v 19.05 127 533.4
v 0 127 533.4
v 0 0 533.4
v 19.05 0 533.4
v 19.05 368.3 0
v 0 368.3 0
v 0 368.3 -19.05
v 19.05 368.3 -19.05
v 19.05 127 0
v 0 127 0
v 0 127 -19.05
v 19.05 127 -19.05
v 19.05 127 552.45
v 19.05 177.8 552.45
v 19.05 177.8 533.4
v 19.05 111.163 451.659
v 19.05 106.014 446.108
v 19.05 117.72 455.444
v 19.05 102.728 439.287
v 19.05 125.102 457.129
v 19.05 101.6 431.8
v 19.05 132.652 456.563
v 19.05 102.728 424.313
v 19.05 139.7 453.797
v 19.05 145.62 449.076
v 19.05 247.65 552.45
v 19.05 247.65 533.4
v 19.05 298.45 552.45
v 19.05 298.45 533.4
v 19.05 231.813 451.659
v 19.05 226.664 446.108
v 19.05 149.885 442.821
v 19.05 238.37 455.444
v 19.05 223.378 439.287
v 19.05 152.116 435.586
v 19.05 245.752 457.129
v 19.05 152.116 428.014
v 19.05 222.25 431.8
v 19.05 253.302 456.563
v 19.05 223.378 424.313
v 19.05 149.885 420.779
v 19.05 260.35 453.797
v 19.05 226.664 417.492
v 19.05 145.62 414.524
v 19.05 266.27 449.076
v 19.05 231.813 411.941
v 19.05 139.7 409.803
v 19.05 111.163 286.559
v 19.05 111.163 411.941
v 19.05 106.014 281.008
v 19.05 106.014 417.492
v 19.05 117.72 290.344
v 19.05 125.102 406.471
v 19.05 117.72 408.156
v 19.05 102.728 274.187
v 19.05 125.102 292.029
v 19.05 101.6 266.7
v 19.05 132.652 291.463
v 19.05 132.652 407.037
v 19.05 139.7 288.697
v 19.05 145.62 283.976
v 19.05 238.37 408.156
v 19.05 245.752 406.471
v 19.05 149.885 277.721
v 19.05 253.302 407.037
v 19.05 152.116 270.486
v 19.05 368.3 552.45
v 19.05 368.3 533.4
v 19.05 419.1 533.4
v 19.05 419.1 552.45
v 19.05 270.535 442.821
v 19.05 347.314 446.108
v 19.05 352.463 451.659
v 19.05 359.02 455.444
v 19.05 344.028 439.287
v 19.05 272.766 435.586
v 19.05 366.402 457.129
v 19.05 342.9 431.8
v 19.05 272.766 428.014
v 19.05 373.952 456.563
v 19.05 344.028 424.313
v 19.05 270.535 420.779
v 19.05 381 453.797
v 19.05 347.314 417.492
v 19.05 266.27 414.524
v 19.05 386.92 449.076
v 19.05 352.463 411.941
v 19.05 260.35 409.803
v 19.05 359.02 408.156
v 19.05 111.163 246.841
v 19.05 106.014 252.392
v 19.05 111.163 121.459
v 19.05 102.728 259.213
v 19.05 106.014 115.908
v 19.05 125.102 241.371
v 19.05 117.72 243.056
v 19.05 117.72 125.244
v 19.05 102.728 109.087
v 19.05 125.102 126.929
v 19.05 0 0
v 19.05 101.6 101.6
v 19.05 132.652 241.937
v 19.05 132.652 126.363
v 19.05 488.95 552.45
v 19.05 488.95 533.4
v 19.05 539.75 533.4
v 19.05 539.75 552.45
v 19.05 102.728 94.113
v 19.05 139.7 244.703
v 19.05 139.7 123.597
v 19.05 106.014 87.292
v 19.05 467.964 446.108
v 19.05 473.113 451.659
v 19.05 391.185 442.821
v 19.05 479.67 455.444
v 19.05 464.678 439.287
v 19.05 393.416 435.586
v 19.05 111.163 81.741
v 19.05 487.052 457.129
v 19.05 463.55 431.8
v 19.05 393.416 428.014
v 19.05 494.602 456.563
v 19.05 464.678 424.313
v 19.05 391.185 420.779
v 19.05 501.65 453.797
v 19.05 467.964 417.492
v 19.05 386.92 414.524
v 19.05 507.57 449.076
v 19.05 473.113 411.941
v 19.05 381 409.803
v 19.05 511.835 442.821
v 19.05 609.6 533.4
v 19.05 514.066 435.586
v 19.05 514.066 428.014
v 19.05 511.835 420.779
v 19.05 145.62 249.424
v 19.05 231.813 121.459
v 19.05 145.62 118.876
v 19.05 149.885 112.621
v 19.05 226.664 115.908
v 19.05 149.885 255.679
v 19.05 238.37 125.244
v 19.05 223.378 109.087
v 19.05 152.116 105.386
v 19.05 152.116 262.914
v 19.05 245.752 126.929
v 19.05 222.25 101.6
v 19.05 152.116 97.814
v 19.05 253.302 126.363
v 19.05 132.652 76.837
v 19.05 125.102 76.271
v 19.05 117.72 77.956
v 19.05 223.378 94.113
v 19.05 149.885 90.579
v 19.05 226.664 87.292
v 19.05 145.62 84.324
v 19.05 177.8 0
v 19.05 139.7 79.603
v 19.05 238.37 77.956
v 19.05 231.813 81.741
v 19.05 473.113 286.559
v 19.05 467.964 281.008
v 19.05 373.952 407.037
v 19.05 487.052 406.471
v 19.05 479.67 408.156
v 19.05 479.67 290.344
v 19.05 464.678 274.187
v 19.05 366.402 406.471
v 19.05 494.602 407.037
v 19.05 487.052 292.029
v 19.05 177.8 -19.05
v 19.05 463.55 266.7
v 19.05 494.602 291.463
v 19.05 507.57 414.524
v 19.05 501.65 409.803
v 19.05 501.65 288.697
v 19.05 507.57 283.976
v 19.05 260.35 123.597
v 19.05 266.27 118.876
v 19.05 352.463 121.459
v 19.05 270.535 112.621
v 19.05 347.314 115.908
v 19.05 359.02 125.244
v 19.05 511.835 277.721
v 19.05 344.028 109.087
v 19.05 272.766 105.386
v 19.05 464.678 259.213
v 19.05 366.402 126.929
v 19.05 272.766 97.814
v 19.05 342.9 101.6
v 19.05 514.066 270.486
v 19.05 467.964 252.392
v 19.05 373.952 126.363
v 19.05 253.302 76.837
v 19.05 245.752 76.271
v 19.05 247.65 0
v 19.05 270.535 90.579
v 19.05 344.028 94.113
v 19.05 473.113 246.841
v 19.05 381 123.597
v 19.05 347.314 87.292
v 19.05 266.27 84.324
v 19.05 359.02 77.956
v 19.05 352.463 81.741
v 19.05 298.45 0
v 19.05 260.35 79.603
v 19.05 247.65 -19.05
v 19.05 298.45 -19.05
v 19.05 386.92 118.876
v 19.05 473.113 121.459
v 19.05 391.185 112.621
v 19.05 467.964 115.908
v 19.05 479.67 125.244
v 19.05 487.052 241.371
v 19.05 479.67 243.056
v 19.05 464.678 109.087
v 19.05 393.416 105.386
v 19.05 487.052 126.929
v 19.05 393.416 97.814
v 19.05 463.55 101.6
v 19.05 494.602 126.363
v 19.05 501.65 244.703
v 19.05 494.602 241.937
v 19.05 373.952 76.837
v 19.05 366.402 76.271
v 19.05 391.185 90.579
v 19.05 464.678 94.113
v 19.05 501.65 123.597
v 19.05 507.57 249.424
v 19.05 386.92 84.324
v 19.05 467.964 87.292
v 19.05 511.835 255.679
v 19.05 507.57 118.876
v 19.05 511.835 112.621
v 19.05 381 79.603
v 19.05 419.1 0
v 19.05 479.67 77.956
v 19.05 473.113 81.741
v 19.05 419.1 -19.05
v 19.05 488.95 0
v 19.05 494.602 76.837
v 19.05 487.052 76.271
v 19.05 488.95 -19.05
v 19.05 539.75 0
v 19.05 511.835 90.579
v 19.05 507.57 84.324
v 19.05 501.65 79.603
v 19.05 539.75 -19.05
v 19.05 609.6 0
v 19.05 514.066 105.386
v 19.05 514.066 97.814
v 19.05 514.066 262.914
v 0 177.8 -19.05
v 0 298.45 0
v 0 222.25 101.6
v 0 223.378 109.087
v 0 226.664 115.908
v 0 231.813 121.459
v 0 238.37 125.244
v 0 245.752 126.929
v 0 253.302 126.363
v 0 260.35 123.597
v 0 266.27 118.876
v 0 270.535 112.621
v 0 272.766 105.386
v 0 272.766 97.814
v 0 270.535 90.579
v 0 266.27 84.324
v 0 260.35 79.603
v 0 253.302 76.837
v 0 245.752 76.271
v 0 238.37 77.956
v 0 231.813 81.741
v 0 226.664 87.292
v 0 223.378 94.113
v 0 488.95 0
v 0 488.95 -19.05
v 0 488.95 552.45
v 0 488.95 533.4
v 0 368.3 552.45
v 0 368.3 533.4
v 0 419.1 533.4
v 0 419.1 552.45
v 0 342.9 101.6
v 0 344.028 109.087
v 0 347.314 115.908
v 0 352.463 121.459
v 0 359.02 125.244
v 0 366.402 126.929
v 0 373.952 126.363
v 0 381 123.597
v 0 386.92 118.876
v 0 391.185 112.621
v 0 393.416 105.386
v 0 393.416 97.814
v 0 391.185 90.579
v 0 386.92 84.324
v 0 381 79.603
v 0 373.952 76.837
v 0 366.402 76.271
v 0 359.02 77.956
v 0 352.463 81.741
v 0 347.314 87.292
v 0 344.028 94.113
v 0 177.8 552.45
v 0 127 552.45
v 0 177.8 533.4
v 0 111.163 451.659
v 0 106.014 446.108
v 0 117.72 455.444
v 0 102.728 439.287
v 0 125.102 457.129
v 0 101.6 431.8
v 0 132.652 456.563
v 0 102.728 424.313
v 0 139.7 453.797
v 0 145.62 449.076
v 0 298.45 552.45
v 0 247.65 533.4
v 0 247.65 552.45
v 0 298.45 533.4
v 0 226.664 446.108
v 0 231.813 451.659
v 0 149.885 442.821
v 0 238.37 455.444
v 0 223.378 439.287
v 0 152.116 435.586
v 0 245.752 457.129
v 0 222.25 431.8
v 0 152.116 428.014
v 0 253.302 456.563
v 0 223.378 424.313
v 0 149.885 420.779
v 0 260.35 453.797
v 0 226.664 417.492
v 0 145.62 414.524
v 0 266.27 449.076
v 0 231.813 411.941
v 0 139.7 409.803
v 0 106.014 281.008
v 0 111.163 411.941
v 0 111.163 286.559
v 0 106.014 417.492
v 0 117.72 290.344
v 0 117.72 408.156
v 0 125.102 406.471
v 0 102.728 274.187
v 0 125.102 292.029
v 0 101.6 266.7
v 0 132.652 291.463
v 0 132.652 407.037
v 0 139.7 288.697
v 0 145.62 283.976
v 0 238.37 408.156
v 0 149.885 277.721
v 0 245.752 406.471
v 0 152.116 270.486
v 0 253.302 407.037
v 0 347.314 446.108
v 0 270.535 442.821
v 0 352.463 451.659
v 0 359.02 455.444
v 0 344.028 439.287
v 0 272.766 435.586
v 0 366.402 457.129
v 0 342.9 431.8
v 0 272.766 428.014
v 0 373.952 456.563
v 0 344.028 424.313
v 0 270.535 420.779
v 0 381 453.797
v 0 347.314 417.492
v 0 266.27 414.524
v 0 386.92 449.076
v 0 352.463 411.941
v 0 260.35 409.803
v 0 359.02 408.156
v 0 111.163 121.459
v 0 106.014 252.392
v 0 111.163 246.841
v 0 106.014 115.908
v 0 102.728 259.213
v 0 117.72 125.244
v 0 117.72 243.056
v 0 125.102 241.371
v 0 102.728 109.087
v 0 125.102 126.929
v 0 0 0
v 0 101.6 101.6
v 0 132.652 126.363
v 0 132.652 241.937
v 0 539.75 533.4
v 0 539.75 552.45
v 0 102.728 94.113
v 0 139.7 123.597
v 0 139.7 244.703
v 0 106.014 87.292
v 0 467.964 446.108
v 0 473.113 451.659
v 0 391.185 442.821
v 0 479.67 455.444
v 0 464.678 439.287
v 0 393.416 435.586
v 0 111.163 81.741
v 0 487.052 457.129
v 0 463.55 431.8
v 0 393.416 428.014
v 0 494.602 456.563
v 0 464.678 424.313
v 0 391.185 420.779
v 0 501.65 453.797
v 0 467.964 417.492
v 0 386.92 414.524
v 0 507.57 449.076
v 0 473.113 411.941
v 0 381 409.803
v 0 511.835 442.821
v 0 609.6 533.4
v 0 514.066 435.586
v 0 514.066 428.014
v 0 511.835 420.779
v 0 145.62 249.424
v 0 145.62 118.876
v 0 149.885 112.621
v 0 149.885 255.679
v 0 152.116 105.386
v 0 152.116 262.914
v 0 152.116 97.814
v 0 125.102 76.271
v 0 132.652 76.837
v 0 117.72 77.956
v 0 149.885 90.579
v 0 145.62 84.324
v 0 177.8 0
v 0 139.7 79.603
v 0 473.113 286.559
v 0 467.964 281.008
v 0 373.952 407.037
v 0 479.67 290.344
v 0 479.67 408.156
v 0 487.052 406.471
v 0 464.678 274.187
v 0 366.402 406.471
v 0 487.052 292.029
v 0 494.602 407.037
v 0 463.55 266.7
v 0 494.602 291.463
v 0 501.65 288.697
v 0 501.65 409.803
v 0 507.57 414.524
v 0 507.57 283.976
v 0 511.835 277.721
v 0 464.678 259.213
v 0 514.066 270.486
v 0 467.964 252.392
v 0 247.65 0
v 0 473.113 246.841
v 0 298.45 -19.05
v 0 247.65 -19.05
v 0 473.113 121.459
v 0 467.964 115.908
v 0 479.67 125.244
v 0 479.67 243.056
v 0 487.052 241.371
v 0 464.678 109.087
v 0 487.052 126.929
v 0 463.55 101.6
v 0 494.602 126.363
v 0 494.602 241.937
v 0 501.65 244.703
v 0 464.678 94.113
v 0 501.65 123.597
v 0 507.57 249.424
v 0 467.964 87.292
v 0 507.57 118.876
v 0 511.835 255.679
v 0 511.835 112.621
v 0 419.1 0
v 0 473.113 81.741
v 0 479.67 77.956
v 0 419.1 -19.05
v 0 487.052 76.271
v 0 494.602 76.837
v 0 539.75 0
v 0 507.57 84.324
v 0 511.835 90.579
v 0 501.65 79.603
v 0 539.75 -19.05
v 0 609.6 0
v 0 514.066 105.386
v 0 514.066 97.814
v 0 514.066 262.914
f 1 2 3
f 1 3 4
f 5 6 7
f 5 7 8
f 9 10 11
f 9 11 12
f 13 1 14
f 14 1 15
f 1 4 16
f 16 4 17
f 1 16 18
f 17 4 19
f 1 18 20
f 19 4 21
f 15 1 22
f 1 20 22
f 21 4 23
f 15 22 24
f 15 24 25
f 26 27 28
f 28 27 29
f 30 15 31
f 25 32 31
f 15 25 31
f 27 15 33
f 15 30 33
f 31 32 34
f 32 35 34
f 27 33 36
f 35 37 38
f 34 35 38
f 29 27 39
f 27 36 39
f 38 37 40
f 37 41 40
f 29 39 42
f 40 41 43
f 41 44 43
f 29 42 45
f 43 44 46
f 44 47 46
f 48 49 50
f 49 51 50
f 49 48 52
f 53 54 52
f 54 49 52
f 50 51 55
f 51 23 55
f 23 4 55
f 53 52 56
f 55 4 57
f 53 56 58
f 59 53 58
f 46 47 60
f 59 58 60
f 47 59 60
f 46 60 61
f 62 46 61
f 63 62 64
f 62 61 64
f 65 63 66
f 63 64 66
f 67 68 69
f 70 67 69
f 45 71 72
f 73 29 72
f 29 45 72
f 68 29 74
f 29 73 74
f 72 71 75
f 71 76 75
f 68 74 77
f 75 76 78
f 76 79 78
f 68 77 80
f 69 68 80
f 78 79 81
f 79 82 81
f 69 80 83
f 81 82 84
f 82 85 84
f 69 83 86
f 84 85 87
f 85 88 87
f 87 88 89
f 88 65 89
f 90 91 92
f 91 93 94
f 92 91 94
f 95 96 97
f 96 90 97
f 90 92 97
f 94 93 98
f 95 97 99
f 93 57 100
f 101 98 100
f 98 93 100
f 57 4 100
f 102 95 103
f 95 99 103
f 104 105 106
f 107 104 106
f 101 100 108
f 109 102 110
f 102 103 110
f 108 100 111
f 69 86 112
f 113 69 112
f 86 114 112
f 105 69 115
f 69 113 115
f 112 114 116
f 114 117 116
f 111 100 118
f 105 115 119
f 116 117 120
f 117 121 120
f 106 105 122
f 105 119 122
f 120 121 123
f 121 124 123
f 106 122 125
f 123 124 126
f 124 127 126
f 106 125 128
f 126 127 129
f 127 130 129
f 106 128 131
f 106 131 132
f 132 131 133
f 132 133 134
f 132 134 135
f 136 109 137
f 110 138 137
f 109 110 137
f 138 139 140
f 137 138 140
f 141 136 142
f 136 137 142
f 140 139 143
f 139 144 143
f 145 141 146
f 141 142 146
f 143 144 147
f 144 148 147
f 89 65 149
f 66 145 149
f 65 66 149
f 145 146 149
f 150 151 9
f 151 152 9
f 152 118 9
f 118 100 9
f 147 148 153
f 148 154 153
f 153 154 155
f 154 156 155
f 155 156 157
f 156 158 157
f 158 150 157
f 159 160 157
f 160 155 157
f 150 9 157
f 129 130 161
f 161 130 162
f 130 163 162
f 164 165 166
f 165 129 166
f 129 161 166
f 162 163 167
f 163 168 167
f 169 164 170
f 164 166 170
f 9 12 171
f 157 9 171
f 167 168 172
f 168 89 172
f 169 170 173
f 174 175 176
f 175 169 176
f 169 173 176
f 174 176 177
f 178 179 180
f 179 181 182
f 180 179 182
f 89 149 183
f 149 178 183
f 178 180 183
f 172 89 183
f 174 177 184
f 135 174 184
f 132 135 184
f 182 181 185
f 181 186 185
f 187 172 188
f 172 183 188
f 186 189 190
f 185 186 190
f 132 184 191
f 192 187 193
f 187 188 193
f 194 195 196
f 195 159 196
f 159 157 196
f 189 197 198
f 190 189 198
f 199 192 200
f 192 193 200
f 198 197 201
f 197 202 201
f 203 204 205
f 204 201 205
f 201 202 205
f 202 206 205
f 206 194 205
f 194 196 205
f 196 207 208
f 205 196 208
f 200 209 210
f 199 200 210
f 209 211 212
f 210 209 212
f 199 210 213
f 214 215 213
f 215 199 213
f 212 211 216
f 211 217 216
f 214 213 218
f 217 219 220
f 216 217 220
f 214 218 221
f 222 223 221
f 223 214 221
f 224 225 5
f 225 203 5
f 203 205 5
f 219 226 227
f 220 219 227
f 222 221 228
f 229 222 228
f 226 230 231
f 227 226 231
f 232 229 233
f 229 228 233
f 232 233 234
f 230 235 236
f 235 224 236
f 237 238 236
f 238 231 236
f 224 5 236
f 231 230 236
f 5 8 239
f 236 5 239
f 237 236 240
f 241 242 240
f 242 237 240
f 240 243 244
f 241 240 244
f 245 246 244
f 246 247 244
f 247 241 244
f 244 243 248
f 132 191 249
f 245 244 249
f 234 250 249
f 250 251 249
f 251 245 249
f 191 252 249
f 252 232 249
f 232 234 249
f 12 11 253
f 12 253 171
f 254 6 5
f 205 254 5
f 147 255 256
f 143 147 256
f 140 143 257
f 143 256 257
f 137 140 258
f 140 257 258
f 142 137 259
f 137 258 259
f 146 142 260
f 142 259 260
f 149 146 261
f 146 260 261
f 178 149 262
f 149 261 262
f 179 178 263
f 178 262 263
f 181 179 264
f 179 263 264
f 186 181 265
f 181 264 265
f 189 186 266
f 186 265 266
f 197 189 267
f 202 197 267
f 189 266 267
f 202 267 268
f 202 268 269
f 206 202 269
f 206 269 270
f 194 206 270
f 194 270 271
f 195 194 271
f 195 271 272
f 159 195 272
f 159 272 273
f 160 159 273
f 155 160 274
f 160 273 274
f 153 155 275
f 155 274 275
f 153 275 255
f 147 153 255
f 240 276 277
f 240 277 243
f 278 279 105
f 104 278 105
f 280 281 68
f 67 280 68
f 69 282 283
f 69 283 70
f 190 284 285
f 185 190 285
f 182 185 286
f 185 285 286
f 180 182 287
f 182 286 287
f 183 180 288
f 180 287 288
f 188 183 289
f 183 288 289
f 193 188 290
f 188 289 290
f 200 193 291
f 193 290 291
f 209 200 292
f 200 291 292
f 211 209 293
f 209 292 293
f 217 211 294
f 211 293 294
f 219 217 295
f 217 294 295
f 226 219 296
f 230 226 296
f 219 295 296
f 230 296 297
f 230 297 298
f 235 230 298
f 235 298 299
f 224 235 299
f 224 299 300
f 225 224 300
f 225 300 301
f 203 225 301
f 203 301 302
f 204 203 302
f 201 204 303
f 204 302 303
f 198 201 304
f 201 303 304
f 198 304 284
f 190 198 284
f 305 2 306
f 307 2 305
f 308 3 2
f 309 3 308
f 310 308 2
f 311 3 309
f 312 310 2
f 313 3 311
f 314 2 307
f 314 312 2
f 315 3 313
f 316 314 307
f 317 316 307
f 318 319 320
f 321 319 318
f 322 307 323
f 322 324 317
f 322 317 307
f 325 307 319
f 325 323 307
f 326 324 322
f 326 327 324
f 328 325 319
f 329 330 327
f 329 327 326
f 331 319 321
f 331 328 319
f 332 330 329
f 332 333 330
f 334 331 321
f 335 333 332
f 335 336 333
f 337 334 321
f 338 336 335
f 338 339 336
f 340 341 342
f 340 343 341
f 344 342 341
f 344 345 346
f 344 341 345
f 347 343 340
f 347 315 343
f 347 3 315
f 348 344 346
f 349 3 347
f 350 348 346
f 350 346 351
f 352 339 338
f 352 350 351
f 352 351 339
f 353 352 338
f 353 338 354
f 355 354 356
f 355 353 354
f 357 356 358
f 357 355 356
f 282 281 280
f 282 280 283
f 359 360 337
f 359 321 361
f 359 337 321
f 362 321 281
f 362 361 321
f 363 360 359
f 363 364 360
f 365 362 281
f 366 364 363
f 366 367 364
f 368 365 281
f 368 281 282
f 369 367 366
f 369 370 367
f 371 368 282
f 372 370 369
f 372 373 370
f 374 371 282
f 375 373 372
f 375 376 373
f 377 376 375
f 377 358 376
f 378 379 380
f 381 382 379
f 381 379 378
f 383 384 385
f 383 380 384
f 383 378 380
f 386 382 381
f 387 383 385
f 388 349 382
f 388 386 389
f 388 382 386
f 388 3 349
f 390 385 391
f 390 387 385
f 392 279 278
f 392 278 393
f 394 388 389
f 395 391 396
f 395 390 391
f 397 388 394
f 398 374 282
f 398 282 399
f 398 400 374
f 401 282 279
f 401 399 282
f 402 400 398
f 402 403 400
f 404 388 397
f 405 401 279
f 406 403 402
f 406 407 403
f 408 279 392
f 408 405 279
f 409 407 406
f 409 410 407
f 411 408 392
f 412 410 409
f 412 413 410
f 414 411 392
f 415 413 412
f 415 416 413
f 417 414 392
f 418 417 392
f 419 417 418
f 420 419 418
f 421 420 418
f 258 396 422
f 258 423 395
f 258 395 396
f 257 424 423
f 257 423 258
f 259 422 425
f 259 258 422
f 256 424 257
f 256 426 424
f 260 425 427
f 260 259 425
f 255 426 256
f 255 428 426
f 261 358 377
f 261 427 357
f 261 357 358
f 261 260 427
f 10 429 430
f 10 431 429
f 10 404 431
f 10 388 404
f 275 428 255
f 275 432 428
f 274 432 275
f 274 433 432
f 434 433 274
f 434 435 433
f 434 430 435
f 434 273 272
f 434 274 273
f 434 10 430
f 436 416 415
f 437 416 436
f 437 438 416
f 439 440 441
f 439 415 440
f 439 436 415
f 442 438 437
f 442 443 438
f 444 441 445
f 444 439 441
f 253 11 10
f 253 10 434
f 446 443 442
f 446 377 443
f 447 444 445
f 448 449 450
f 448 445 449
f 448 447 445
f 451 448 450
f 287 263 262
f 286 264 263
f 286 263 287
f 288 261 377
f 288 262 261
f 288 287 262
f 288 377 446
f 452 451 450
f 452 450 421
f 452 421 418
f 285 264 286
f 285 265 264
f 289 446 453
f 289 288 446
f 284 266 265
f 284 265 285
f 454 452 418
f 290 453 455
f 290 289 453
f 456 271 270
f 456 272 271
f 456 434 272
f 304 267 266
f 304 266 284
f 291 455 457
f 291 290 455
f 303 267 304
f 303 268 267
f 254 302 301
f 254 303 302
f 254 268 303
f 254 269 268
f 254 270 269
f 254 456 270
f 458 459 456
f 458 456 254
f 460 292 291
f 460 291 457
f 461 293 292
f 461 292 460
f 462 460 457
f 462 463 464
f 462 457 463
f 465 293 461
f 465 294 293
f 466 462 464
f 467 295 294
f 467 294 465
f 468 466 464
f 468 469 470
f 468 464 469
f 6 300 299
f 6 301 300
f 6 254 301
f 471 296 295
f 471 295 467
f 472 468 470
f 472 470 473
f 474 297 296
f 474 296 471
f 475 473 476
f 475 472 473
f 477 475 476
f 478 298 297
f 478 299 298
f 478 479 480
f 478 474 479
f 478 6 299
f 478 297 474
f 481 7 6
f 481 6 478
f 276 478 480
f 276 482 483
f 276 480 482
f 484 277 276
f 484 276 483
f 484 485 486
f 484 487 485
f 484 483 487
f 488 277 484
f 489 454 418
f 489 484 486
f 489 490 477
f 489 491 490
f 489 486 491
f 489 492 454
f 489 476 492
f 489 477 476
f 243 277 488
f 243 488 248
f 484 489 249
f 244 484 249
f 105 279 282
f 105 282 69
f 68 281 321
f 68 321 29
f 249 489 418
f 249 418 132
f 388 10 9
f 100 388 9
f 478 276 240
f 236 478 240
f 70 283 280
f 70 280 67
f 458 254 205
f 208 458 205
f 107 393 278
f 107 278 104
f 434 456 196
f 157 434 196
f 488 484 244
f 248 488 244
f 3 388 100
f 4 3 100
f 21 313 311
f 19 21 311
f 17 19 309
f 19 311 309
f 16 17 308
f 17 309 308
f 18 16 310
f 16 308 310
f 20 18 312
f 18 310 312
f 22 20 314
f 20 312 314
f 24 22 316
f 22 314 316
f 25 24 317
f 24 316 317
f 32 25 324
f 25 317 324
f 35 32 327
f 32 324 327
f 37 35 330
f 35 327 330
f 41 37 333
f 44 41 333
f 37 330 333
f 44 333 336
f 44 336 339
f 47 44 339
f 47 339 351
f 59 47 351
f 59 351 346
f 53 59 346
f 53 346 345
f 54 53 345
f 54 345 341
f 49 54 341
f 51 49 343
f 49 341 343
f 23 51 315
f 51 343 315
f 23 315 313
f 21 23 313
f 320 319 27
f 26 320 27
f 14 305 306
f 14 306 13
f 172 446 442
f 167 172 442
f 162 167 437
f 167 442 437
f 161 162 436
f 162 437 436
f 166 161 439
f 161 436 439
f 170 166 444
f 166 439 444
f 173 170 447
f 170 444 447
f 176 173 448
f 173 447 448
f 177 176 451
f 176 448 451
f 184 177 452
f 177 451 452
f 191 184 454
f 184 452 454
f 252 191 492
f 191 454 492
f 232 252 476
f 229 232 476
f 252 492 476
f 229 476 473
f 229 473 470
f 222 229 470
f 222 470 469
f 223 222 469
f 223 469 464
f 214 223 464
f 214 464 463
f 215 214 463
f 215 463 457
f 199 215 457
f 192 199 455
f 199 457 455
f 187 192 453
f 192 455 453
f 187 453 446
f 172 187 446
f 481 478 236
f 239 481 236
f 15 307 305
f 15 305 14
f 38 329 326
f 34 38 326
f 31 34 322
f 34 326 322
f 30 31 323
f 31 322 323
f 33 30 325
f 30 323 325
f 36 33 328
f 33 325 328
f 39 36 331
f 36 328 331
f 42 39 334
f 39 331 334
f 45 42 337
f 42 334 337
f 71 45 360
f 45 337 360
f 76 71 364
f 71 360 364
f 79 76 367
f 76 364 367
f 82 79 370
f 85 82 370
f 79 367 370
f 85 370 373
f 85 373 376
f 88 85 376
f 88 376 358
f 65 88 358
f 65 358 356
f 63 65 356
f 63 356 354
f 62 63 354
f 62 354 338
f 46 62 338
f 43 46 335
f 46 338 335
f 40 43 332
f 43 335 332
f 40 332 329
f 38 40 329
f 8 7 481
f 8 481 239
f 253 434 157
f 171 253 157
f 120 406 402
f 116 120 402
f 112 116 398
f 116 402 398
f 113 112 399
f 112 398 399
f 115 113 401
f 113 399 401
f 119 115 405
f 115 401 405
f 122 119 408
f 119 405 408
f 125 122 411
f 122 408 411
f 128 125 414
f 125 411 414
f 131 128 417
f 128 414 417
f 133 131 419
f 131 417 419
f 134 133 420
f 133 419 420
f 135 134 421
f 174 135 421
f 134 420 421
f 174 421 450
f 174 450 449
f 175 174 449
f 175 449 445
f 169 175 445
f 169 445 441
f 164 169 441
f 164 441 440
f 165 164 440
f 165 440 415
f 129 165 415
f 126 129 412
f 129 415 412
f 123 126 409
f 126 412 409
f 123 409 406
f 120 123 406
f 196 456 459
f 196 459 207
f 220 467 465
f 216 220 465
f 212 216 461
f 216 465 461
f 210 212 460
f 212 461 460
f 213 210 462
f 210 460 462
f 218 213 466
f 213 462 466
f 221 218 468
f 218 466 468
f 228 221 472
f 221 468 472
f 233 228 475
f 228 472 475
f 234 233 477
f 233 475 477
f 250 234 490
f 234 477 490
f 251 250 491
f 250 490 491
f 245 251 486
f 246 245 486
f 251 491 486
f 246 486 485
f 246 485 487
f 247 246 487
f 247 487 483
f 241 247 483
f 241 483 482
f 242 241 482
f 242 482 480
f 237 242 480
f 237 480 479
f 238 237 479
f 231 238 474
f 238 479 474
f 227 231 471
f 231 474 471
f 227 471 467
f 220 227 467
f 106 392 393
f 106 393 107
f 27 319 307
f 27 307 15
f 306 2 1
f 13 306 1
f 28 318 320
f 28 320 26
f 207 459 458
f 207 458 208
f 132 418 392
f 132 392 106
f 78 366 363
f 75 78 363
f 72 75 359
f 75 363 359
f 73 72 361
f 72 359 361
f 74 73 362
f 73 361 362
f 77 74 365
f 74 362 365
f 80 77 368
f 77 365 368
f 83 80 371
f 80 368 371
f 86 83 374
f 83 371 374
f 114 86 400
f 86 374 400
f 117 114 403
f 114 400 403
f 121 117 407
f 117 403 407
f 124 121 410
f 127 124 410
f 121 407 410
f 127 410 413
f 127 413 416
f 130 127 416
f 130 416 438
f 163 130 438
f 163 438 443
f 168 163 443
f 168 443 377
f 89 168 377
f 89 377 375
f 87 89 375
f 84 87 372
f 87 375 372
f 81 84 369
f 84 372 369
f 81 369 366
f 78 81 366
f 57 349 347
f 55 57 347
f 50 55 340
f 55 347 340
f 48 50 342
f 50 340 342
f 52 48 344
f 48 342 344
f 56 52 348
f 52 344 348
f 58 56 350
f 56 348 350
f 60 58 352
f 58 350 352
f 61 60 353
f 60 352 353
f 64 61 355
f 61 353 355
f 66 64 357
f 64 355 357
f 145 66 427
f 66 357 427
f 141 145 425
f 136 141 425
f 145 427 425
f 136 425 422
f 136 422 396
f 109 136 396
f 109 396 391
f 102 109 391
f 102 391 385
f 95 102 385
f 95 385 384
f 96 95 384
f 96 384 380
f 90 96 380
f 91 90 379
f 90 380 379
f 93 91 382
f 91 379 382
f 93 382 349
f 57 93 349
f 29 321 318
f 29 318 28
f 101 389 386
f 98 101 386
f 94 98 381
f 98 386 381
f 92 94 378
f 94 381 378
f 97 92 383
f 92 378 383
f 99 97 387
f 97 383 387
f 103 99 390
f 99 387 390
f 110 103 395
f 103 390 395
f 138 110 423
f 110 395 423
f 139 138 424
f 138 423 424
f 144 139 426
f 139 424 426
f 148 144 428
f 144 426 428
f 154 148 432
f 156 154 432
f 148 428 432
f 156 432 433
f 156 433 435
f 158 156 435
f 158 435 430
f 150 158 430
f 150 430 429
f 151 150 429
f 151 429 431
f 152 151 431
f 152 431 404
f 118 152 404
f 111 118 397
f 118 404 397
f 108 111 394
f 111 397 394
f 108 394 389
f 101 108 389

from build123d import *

# Parameters (mm, degrees)
F0_W     = 19.05
F0_H     = 609.6
F1_DEPTH = 533.4
F2_W     = 19.05
F2_H     = 50.8
F3_DEPTH = 19.05
F4_W     = 19.05
F4_H     = 50.8
F5_DEPTH = 19.05
F6_R     = 25.4
F7_DEPTH = 19.05


with BuildPart() as f1:
    # F0 (on Top) → F1 (new body)
    with BuildSketch(Plane.XY):
        with Locations((9.525, 304.8)):
            Rectangle(F0_W, F0_H)
    extrude(amount=F1_DEPTH)

    # F2 (on face) → F3 (join)
    with BuildSketch(Plane(origin=(0, 0, 0), x_dir=(1, 0, 0), z_dir=(0, 0, -1))):
        with Locations((9.525, -152.4)):
            Rectangle(F2_W, F2_H)
        with Locations((9.525, -273.05)):
            Rectangle(F2_W, F2_H)
        with Locations((9.525, -393.7)):
            Rectangle(F2_W, F2_H)
        with Locations((9.525, -514.35)):
            Rectangle(F2_W, F2_H)
    extrude(amount=F3_DEPTH)

    # F4 (on face) → F5 (join)
    with BuildSketch(Plane.XY.offset(533.4)):
        with Locations((9.525, 514.35)):
            Rectangle(F4_W, F4_H)
        with Locations((9.525, 393.7)):
            Rectangle(F4_W, F4_H)
        with Locations((9.525, 273.05)):
            Rectangle(F4_W, F4_H)
        with Locations((9.525, 152.4)):
            Rectangle(F4_W, F4_H)
    extrude(amount=F5_DEPTH)

    # F6 (on face) → F7 (cut)
    with BuildSketch(Plane(origin=(0, 0, 0), x_dir=(0, -1, 0), z_dir=(-1, 0, 0))):
        with Locations((-488.95, 101.6)):
            Circle(F6_R)
        with Locations((-368.3, 101.6)):
            Circle(F6_R)
        with Locations((-247.65, 101.6)):
            Circle(F6_R)
        with Locations((-127, 101.6)):
            Circle(F6_R)
        with Locations((-488.95, 431.8)):
            Circle(F6_R)
        with Locations((-368.3, 431.8)):
            Circle(F6_R)
        with Locations((-247.65, 431.8)):
            Circle(F6_R)
        with Locations((-127, 431.8)):
            Circle(F6_R)
        with Locations((-127, 266.7)):
            Circle(F6_R)
        with Locations((-488.95, 266.7)):
            Circle(F6_R)
    extrude(amount=-F7_DEPTH, mode=Mode.SUBTRACT)


solid = f1.part
